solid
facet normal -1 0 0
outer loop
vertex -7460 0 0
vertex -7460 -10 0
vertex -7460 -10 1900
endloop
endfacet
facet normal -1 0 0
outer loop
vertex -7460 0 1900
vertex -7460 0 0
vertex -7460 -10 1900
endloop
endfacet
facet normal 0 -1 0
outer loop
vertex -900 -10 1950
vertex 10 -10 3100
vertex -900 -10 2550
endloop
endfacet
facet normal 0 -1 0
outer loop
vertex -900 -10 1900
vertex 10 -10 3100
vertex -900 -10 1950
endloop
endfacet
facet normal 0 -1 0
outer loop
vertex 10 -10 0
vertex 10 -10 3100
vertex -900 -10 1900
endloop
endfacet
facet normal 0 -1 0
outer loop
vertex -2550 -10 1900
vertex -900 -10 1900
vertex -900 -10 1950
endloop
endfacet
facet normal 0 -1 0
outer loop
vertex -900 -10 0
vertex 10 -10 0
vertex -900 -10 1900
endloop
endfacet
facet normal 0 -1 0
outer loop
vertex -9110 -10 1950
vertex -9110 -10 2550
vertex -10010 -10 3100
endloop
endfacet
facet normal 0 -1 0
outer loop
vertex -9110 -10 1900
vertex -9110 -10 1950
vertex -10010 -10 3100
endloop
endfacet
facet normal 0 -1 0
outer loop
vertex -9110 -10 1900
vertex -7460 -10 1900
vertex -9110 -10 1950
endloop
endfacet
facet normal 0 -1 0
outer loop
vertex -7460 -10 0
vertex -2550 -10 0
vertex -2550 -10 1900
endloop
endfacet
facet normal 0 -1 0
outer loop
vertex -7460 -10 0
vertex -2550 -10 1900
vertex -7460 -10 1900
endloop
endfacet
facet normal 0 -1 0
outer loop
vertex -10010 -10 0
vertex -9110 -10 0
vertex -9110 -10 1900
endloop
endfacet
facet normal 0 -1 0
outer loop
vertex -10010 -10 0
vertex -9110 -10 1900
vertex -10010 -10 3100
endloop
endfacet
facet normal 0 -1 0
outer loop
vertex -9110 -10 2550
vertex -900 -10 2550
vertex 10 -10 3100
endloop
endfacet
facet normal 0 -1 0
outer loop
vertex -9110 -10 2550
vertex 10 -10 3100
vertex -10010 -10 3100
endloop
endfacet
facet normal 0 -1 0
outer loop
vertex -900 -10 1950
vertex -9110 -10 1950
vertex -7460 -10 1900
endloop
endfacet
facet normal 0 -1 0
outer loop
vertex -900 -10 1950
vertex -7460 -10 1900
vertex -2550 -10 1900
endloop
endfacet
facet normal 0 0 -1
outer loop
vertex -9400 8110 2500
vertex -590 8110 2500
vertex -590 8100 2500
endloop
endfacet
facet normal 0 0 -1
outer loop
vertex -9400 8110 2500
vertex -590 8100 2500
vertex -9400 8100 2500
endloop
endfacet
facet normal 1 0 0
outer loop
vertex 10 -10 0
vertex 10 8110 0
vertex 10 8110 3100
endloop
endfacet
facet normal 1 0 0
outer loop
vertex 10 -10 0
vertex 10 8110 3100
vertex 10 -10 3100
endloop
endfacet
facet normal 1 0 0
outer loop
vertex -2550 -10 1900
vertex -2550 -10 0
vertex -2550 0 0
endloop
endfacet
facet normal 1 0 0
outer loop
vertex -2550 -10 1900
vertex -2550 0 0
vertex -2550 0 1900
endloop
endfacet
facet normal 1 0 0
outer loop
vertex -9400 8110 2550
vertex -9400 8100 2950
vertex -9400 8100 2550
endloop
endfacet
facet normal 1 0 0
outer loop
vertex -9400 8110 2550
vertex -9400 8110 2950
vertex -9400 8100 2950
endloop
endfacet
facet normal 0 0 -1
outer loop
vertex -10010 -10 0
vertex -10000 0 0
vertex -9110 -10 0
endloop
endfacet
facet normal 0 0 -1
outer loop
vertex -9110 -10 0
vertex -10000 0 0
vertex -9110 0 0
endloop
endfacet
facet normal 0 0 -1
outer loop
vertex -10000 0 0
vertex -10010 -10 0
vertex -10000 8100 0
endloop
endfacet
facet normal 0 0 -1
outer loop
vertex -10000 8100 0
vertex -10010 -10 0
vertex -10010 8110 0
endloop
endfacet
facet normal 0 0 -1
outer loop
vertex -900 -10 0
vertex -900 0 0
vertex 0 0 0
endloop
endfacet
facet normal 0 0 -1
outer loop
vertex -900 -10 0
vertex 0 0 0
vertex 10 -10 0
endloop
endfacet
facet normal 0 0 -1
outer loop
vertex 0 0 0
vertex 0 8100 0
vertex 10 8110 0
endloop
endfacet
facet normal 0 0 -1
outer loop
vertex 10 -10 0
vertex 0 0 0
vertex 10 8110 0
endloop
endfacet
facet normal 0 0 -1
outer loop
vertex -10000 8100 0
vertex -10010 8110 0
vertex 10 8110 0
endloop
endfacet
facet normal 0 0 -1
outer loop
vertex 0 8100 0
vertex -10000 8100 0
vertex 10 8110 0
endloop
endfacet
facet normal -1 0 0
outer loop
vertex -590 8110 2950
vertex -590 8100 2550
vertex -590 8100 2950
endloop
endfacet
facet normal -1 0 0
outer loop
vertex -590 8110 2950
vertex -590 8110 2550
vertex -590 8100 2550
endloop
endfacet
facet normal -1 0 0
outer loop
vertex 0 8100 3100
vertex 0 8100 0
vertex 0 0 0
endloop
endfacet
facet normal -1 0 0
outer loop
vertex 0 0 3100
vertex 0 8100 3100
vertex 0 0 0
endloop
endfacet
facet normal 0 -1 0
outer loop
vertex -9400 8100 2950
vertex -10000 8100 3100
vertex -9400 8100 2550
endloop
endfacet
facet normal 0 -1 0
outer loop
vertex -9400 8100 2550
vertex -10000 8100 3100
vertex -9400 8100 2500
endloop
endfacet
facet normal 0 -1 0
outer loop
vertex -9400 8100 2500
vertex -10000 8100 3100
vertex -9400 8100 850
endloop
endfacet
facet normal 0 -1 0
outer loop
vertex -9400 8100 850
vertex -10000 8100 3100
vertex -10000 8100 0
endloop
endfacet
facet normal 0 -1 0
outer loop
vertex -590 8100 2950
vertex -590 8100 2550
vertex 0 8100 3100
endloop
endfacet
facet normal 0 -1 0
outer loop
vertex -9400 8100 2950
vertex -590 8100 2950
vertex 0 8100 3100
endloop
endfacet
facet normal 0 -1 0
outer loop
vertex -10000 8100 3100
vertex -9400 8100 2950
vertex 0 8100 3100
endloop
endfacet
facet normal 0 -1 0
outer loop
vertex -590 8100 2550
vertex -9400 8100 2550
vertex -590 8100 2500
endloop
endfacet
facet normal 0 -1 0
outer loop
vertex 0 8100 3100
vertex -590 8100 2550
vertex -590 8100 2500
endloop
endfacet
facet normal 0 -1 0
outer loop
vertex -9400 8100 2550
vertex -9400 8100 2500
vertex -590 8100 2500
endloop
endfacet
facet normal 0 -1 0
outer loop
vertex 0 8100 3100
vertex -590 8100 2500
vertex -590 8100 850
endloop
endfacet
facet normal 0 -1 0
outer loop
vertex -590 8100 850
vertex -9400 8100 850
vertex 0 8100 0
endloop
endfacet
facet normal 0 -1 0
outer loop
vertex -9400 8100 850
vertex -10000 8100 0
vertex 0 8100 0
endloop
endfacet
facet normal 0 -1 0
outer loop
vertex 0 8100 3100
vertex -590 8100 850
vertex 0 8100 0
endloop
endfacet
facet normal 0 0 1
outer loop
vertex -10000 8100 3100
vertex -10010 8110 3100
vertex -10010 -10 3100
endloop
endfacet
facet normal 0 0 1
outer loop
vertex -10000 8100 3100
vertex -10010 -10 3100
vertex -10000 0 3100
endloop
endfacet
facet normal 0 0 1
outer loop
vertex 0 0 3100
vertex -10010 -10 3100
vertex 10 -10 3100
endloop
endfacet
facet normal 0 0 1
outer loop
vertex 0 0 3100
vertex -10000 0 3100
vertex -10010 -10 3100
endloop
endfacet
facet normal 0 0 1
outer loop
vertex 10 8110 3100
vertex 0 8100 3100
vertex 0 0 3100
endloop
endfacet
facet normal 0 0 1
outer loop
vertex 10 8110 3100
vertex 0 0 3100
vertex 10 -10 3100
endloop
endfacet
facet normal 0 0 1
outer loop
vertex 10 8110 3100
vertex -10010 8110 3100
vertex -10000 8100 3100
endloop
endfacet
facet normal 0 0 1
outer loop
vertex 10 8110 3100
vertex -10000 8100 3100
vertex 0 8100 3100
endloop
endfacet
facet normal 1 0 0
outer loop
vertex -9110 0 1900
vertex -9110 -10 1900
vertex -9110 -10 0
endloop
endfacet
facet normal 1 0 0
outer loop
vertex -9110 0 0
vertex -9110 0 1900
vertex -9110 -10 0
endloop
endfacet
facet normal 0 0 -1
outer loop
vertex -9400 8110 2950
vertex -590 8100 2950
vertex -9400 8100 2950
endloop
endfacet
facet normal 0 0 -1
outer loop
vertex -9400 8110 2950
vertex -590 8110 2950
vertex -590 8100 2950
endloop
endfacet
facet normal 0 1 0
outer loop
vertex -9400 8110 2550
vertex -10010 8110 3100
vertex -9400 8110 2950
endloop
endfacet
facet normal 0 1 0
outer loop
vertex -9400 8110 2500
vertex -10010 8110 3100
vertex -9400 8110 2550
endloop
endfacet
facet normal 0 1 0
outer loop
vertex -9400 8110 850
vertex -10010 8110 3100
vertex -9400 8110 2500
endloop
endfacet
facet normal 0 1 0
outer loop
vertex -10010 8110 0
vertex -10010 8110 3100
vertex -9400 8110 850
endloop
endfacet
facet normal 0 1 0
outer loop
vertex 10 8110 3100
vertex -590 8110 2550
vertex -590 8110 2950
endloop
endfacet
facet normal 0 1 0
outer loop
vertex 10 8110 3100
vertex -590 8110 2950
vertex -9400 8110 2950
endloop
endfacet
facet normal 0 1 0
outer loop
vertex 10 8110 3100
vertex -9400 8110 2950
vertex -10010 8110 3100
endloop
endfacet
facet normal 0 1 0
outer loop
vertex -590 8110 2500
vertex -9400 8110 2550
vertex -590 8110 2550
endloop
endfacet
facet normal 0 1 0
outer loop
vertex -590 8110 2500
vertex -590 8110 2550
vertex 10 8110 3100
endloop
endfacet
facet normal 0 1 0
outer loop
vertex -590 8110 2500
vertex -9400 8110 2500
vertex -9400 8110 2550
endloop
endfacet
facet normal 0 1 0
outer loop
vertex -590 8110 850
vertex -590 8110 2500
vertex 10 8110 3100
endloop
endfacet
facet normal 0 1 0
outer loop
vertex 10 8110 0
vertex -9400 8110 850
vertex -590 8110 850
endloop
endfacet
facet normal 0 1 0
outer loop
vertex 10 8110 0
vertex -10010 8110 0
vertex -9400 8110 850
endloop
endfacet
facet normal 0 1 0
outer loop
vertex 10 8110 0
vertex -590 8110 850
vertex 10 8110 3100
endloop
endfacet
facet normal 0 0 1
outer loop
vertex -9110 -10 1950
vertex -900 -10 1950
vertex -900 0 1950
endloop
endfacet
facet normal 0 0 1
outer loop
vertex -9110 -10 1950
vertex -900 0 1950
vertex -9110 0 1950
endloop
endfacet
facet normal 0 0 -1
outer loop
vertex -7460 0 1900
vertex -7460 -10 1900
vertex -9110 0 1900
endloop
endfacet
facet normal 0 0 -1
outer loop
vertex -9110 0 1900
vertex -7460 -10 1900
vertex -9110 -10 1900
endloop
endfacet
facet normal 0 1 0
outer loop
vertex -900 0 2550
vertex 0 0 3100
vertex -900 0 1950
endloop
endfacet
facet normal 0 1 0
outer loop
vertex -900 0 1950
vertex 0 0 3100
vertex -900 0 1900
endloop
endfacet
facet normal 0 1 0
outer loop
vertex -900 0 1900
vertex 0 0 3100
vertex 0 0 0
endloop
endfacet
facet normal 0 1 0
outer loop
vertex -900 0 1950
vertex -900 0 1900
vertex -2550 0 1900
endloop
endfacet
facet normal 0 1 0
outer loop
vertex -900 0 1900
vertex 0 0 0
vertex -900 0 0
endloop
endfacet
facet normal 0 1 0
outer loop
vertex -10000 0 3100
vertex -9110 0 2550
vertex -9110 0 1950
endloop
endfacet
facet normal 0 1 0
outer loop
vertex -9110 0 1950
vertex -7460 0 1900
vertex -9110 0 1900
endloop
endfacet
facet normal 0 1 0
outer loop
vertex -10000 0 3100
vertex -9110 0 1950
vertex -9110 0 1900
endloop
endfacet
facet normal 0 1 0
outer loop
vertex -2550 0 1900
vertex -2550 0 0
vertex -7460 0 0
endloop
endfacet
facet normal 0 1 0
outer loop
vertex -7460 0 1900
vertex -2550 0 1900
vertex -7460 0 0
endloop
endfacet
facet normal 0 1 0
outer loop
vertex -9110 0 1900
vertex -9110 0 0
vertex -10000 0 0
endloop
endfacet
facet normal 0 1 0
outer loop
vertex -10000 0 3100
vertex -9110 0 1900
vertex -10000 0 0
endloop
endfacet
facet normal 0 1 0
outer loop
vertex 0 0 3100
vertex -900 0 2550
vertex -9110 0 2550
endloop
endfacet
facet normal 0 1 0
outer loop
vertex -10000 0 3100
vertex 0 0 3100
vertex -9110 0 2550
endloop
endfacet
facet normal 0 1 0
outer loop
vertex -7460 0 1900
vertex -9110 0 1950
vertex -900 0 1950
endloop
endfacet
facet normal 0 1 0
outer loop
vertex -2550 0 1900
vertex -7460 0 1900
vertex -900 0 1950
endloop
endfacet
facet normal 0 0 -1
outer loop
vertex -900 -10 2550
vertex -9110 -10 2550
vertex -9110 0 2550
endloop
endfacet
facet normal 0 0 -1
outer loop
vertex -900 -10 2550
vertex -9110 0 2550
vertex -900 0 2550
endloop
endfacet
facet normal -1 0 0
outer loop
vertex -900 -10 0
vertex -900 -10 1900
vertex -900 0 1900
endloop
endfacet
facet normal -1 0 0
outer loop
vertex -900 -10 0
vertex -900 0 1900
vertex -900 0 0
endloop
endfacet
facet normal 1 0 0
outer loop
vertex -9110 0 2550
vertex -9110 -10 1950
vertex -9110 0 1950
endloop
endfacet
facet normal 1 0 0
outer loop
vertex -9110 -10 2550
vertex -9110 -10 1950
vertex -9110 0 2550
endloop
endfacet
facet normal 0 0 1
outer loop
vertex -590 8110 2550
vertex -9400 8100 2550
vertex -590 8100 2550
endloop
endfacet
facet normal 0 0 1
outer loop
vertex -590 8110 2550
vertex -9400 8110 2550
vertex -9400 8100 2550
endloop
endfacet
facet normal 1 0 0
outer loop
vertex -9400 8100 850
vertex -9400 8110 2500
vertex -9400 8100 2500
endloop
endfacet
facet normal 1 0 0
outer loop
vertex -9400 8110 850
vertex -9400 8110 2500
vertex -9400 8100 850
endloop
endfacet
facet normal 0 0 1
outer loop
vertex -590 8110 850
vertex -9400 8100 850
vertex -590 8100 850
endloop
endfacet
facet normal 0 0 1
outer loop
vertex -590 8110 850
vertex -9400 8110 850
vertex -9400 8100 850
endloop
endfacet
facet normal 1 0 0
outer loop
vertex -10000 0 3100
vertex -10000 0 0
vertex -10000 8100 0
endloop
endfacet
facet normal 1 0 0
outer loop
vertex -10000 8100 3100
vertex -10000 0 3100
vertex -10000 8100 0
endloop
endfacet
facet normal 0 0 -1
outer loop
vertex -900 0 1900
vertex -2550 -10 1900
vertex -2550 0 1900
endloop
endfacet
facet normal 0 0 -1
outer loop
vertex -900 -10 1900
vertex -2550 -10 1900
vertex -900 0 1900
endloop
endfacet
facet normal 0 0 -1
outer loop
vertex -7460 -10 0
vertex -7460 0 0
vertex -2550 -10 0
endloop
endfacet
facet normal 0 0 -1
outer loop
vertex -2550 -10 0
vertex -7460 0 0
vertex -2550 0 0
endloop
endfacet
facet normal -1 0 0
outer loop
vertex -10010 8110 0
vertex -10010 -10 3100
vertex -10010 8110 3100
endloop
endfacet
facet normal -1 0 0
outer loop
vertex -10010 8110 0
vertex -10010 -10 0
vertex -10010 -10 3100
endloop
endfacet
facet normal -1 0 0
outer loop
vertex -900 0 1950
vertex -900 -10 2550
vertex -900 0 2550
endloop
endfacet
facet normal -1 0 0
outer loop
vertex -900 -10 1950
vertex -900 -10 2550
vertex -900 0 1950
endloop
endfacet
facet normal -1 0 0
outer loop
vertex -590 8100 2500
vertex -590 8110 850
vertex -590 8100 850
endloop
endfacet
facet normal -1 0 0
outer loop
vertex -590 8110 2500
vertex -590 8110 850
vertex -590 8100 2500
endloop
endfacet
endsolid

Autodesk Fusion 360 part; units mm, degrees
sketch "スケッチ1" plane through (0, 0, 0) normal (0, 1, 0) x (1, 0, 0)
sketch "スケッチ2" plane through (0, 0, 0) normal (0, 0, 1) x (1, 0, 0)
  line L0 (0, 0) -> (-10000, 0)
  line L1 (-10000, 0) -> (-10000, 8100)
  line L2 (-10000, 8100) -> (0, 8100)
  line L3 (0, 8100) -> (0, 0)
  line L4 (10, -10) -> (-10010, -10)
  line L5 (-10010, -10) -> (-10010, 8110)
  line L6 (-10010, 8110) -> (10, 8110)
  line L7 (10, 8110) -> (10, -10)
  point P0 (10, -10)
  dimension "d1" = 10000
  dimension "d2" = 8100
  dimension "d4" = 10020
  dimension "d5" = 8120
extrude "押し出し1" add sketch "スケッチ2" along normal blind 3100
sketch "スケッチ3" plane through (0, -10, 0) normal (0, -1, 0) x (1, 0, 0)
  line L0 (-10010, 0) -> (10, 0)
  line L1 (10, 0) -> (10, 3100)
  line L2 (10, 3100) -> (-10010, 3100)
  line L3 (-10010, 3100) -> (-10010, 0)
  line L4 (-900, 0) -> (-2550, 0)
  line L5 (-2550, 0) -> (-2550, 1900)
  line L6 (-2550, 1900) -> (-900, 1900)
  line L7 (-900, 1900) -> (-900, 0)
  line L8 (-9110, 0) -> (-7460, 0)
  line L9 (-7460, 0) -> (-7460, 1900)
  line L10 (-7460, 1900) -> (-9110, 1900)
  line L11 (-9110, 1900) -> (-9110, 0)
  line L12 (-900, 1950) -> (-9110, 1950)
  line L13 (-9110, 1950) -> (-9110, 2550)
  line L14 (-9110, 2550) -> (-900, 2550)
  line L15 (-900, 2550) -> (-900, 1950)
  point P0 (-900, 0)
  point P1 (-9110, 0)
  point P2 (-900, 1900)
  point P3 (-900, 1950)
  dimension "d8" = 900
  dimension "d9" = 900
  dimension "d12" = 1650
  dimension "d13" = 1900
  dimension "d14" = 50
  dimension "d15" = 600
extrude "押し出し2" cut sketch "スケッチ3" against normal blind 200 contours L0 L8 L9 L10 L11 | L0 L4 L5 L6 L7 | L12 L13 L14 L15
sketch "スケッチ4" plane through (0, 8110, 0) normal (0, 1, 0) x (-1, 0, 0)
  line L0 (-10, 0) -> (10010, 0)
  line L1 (10010, 0) -> (10010, 3100)
  line L2 (10010, 3100) -> (-10, 3100)
  line L3 (-10, 3100) -> (-10, 0)
sketch "スケッチ5" plane through (-5000, 8110, 1550) normal (0, 1, 0) x (-1, 0, 0)
  line L0 (-5010, 1550) -> (-5010, -1550)
  line L1 (-4410, 1400) -> (4400, 1400)
  line L2 (4400, 1400) -> (4400, 1000)
  line L3 (4400, 1000) -> (-4410, 1000)
  line L4 (-4410, 1000) -> (-4410, 1400)
  line L5 (-4410, 950) -> (4400, 950)
  line L6 (4400, 950) -> (4400, -700)
  line L7 (4400, -700) -> (-4410, -700)
  line L8 (-4410, -700) -> (-4410, 950)
  line L9 (-5010, -1550) -> (5010, -1550)
  point P0 (-4410, 1400)
  point P1 (-5010, 1550)
  point P2 (4410, 1400)
  point P3 (5010, 1550)
  point P4 (-4410, 950)
  dimension "d18" = 600
  dimension "d19" = 150
  dimension "d20" = 600
  dimension "d21" = 50
  dimension "d23" = 1650
extrude "押し出し3" cut sketch "スケッチ5" against normal blind 900
